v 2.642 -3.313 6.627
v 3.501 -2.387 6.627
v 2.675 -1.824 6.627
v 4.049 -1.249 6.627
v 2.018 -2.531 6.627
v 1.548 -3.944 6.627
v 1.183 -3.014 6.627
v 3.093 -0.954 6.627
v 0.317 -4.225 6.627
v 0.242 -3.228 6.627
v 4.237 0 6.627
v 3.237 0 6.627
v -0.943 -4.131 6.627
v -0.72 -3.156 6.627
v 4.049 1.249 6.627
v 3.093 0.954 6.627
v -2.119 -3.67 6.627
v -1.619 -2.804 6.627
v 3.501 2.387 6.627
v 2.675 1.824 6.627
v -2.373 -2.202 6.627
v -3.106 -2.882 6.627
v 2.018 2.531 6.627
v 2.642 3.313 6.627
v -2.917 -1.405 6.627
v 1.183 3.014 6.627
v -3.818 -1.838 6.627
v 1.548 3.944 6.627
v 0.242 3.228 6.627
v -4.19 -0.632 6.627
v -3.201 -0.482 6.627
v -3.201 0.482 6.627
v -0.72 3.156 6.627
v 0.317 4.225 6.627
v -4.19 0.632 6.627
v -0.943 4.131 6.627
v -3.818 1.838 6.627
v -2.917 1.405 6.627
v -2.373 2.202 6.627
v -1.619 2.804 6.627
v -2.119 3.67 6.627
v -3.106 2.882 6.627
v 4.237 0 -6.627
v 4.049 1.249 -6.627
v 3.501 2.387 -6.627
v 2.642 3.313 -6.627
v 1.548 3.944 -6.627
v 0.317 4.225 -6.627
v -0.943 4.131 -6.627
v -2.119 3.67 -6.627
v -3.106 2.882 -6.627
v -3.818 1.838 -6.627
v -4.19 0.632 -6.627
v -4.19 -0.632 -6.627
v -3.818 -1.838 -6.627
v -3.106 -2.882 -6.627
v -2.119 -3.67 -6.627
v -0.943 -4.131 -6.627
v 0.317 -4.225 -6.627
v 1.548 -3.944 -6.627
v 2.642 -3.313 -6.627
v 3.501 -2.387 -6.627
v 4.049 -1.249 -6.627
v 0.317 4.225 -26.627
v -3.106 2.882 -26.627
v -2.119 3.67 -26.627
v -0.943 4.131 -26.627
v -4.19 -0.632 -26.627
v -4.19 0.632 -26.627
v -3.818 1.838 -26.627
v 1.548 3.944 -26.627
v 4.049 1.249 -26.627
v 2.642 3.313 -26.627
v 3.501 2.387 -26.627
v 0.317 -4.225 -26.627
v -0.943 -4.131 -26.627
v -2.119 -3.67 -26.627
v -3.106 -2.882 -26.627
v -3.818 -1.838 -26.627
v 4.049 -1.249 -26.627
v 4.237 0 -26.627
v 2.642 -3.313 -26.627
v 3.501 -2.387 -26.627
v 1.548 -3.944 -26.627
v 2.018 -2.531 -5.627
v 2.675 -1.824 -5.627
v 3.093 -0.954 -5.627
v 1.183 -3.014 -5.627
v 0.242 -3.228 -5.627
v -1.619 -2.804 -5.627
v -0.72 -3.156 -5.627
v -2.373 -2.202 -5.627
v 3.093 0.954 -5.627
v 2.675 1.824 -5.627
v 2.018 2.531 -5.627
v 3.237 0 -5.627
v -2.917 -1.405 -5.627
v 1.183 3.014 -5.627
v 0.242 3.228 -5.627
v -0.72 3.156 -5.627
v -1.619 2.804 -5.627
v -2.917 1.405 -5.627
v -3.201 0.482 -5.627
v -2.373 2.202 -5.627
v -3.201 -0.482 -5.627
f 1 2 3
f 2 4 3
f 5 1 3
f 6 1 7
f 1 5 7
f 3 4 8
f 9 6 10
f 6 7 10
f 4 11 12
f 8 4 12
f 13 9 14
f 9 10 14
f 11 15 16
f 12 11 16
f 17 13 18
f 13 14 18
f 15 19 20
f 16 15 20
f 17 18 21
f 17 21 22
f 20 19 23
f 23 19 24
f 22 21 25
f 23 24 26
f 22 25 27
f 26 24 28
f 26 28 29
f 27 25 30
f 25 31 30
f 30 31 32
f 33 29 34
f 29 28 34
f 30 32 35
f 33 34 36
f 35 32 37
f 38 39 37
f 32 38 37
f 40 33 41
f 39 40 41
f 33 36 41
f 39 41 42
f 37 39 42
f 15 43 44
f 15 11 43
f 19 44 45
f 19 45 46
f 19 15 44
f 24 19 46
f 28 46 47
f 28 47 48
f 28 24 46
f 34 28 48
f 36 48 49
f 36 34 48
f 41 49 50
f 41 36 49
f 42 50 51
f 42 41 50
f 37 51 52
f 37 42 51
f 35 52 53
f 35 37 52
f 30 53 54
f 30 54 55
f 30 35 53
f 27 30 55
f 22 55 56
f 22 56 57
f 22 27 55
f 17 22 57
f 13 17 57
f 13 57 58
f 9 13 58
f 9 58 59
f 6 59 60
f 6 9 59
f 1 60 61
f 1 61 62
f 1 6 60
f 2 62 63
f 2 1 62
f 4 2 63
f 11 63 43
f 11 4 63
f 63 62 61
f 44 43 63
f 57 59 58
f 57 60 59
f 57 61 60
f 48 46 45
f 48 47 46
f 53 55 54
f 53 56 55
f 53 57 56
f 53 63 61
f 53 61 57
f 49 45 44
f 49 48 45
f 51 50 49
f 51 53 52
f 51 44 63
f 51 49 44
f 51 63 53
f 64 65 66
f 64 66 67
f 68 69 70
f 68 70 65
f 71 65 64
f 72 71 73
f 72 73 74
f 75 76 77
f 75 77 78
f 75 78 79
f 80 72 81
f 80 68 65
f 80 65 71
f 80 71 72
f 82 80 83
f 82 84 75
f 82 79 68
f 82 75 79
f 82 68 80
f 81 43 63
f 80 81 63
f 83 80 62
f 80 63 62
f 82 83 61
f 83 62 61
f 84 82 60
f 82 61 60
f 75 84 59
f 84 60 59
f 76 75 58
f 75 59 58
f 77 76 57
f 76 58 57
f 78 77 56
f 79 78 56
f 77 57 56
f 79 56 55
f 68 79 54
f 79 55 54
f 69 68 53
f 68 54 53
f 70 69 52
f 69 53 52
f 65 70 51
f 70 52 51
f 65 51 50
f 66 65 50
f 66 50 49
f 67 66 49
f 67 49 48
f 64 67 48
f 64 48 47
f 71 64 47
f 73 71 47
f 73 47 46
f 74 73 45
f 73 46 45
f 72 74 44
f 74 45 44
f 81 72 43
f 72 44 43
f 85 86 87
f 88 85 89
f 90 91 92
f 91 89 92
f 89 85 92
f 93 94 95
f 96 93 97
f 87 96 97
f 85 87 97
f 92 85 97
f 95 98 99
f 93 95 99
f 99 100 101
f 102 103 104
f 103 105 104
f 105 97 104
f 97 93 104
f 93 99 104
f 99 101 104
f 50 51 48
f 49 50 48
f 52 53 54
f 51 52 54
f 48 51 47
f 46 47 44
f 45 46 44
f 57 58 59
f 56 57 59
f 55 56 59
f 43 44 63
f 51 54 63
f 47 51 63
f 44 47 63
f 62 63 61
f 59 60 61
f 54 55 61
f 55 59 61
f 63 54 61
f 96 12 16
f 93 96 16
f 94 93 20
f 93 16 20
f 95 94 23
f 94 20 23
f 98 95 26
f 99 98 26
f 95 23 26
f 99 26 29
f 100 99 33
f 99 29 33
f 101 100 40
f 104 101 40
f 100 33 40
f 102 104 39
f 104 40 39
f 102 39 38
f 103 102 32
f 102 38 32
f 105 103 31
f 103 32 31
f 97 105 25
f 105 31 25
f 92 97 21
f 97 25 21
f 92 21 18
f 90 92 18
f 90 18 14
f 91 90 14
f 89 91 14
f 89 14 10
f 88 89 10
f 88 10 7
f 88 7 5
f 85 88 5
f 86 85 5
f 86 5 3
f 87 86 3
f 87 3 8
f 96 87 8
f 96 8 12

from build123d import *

# Parameters (mm, degrees)
F0_W      = 4.237288
F0_H      = 13.254238
F2_T      = -1
F1_FACE_R = 4.237288
F3_DEPTH  = 20


with BuildPart() as f1:
    # F0 (on Front) → F1 (revolve)
    with BuildSketch(Plane.XZ):
        with Locations((2.118644, 0)):
            Rectangle(F0_W, F0_H)
    revolve(axis=Axis((0, 0, 0), (0, 0, 1)))

    # F2
    f2_openings = [f1.faces().sort_by_distance(p)[0] for p in [
        (0, 0, 6.627119),
    ]]
    offset(amount=F2_T, openings=f2_openings)


with BuildPart() as f3:
    # F1_face (on face) → F3 (new body)
    with BuildSketch(Plane(origin=(0, 0, -6.627119), x_dir=(1, 0, 0), z_dir=(0, 0, -1))):
        Circle(F1_FACE_R)
    extrude(amount=F3_DEPTH)


solid = Compound([f1.part, f3.part])
